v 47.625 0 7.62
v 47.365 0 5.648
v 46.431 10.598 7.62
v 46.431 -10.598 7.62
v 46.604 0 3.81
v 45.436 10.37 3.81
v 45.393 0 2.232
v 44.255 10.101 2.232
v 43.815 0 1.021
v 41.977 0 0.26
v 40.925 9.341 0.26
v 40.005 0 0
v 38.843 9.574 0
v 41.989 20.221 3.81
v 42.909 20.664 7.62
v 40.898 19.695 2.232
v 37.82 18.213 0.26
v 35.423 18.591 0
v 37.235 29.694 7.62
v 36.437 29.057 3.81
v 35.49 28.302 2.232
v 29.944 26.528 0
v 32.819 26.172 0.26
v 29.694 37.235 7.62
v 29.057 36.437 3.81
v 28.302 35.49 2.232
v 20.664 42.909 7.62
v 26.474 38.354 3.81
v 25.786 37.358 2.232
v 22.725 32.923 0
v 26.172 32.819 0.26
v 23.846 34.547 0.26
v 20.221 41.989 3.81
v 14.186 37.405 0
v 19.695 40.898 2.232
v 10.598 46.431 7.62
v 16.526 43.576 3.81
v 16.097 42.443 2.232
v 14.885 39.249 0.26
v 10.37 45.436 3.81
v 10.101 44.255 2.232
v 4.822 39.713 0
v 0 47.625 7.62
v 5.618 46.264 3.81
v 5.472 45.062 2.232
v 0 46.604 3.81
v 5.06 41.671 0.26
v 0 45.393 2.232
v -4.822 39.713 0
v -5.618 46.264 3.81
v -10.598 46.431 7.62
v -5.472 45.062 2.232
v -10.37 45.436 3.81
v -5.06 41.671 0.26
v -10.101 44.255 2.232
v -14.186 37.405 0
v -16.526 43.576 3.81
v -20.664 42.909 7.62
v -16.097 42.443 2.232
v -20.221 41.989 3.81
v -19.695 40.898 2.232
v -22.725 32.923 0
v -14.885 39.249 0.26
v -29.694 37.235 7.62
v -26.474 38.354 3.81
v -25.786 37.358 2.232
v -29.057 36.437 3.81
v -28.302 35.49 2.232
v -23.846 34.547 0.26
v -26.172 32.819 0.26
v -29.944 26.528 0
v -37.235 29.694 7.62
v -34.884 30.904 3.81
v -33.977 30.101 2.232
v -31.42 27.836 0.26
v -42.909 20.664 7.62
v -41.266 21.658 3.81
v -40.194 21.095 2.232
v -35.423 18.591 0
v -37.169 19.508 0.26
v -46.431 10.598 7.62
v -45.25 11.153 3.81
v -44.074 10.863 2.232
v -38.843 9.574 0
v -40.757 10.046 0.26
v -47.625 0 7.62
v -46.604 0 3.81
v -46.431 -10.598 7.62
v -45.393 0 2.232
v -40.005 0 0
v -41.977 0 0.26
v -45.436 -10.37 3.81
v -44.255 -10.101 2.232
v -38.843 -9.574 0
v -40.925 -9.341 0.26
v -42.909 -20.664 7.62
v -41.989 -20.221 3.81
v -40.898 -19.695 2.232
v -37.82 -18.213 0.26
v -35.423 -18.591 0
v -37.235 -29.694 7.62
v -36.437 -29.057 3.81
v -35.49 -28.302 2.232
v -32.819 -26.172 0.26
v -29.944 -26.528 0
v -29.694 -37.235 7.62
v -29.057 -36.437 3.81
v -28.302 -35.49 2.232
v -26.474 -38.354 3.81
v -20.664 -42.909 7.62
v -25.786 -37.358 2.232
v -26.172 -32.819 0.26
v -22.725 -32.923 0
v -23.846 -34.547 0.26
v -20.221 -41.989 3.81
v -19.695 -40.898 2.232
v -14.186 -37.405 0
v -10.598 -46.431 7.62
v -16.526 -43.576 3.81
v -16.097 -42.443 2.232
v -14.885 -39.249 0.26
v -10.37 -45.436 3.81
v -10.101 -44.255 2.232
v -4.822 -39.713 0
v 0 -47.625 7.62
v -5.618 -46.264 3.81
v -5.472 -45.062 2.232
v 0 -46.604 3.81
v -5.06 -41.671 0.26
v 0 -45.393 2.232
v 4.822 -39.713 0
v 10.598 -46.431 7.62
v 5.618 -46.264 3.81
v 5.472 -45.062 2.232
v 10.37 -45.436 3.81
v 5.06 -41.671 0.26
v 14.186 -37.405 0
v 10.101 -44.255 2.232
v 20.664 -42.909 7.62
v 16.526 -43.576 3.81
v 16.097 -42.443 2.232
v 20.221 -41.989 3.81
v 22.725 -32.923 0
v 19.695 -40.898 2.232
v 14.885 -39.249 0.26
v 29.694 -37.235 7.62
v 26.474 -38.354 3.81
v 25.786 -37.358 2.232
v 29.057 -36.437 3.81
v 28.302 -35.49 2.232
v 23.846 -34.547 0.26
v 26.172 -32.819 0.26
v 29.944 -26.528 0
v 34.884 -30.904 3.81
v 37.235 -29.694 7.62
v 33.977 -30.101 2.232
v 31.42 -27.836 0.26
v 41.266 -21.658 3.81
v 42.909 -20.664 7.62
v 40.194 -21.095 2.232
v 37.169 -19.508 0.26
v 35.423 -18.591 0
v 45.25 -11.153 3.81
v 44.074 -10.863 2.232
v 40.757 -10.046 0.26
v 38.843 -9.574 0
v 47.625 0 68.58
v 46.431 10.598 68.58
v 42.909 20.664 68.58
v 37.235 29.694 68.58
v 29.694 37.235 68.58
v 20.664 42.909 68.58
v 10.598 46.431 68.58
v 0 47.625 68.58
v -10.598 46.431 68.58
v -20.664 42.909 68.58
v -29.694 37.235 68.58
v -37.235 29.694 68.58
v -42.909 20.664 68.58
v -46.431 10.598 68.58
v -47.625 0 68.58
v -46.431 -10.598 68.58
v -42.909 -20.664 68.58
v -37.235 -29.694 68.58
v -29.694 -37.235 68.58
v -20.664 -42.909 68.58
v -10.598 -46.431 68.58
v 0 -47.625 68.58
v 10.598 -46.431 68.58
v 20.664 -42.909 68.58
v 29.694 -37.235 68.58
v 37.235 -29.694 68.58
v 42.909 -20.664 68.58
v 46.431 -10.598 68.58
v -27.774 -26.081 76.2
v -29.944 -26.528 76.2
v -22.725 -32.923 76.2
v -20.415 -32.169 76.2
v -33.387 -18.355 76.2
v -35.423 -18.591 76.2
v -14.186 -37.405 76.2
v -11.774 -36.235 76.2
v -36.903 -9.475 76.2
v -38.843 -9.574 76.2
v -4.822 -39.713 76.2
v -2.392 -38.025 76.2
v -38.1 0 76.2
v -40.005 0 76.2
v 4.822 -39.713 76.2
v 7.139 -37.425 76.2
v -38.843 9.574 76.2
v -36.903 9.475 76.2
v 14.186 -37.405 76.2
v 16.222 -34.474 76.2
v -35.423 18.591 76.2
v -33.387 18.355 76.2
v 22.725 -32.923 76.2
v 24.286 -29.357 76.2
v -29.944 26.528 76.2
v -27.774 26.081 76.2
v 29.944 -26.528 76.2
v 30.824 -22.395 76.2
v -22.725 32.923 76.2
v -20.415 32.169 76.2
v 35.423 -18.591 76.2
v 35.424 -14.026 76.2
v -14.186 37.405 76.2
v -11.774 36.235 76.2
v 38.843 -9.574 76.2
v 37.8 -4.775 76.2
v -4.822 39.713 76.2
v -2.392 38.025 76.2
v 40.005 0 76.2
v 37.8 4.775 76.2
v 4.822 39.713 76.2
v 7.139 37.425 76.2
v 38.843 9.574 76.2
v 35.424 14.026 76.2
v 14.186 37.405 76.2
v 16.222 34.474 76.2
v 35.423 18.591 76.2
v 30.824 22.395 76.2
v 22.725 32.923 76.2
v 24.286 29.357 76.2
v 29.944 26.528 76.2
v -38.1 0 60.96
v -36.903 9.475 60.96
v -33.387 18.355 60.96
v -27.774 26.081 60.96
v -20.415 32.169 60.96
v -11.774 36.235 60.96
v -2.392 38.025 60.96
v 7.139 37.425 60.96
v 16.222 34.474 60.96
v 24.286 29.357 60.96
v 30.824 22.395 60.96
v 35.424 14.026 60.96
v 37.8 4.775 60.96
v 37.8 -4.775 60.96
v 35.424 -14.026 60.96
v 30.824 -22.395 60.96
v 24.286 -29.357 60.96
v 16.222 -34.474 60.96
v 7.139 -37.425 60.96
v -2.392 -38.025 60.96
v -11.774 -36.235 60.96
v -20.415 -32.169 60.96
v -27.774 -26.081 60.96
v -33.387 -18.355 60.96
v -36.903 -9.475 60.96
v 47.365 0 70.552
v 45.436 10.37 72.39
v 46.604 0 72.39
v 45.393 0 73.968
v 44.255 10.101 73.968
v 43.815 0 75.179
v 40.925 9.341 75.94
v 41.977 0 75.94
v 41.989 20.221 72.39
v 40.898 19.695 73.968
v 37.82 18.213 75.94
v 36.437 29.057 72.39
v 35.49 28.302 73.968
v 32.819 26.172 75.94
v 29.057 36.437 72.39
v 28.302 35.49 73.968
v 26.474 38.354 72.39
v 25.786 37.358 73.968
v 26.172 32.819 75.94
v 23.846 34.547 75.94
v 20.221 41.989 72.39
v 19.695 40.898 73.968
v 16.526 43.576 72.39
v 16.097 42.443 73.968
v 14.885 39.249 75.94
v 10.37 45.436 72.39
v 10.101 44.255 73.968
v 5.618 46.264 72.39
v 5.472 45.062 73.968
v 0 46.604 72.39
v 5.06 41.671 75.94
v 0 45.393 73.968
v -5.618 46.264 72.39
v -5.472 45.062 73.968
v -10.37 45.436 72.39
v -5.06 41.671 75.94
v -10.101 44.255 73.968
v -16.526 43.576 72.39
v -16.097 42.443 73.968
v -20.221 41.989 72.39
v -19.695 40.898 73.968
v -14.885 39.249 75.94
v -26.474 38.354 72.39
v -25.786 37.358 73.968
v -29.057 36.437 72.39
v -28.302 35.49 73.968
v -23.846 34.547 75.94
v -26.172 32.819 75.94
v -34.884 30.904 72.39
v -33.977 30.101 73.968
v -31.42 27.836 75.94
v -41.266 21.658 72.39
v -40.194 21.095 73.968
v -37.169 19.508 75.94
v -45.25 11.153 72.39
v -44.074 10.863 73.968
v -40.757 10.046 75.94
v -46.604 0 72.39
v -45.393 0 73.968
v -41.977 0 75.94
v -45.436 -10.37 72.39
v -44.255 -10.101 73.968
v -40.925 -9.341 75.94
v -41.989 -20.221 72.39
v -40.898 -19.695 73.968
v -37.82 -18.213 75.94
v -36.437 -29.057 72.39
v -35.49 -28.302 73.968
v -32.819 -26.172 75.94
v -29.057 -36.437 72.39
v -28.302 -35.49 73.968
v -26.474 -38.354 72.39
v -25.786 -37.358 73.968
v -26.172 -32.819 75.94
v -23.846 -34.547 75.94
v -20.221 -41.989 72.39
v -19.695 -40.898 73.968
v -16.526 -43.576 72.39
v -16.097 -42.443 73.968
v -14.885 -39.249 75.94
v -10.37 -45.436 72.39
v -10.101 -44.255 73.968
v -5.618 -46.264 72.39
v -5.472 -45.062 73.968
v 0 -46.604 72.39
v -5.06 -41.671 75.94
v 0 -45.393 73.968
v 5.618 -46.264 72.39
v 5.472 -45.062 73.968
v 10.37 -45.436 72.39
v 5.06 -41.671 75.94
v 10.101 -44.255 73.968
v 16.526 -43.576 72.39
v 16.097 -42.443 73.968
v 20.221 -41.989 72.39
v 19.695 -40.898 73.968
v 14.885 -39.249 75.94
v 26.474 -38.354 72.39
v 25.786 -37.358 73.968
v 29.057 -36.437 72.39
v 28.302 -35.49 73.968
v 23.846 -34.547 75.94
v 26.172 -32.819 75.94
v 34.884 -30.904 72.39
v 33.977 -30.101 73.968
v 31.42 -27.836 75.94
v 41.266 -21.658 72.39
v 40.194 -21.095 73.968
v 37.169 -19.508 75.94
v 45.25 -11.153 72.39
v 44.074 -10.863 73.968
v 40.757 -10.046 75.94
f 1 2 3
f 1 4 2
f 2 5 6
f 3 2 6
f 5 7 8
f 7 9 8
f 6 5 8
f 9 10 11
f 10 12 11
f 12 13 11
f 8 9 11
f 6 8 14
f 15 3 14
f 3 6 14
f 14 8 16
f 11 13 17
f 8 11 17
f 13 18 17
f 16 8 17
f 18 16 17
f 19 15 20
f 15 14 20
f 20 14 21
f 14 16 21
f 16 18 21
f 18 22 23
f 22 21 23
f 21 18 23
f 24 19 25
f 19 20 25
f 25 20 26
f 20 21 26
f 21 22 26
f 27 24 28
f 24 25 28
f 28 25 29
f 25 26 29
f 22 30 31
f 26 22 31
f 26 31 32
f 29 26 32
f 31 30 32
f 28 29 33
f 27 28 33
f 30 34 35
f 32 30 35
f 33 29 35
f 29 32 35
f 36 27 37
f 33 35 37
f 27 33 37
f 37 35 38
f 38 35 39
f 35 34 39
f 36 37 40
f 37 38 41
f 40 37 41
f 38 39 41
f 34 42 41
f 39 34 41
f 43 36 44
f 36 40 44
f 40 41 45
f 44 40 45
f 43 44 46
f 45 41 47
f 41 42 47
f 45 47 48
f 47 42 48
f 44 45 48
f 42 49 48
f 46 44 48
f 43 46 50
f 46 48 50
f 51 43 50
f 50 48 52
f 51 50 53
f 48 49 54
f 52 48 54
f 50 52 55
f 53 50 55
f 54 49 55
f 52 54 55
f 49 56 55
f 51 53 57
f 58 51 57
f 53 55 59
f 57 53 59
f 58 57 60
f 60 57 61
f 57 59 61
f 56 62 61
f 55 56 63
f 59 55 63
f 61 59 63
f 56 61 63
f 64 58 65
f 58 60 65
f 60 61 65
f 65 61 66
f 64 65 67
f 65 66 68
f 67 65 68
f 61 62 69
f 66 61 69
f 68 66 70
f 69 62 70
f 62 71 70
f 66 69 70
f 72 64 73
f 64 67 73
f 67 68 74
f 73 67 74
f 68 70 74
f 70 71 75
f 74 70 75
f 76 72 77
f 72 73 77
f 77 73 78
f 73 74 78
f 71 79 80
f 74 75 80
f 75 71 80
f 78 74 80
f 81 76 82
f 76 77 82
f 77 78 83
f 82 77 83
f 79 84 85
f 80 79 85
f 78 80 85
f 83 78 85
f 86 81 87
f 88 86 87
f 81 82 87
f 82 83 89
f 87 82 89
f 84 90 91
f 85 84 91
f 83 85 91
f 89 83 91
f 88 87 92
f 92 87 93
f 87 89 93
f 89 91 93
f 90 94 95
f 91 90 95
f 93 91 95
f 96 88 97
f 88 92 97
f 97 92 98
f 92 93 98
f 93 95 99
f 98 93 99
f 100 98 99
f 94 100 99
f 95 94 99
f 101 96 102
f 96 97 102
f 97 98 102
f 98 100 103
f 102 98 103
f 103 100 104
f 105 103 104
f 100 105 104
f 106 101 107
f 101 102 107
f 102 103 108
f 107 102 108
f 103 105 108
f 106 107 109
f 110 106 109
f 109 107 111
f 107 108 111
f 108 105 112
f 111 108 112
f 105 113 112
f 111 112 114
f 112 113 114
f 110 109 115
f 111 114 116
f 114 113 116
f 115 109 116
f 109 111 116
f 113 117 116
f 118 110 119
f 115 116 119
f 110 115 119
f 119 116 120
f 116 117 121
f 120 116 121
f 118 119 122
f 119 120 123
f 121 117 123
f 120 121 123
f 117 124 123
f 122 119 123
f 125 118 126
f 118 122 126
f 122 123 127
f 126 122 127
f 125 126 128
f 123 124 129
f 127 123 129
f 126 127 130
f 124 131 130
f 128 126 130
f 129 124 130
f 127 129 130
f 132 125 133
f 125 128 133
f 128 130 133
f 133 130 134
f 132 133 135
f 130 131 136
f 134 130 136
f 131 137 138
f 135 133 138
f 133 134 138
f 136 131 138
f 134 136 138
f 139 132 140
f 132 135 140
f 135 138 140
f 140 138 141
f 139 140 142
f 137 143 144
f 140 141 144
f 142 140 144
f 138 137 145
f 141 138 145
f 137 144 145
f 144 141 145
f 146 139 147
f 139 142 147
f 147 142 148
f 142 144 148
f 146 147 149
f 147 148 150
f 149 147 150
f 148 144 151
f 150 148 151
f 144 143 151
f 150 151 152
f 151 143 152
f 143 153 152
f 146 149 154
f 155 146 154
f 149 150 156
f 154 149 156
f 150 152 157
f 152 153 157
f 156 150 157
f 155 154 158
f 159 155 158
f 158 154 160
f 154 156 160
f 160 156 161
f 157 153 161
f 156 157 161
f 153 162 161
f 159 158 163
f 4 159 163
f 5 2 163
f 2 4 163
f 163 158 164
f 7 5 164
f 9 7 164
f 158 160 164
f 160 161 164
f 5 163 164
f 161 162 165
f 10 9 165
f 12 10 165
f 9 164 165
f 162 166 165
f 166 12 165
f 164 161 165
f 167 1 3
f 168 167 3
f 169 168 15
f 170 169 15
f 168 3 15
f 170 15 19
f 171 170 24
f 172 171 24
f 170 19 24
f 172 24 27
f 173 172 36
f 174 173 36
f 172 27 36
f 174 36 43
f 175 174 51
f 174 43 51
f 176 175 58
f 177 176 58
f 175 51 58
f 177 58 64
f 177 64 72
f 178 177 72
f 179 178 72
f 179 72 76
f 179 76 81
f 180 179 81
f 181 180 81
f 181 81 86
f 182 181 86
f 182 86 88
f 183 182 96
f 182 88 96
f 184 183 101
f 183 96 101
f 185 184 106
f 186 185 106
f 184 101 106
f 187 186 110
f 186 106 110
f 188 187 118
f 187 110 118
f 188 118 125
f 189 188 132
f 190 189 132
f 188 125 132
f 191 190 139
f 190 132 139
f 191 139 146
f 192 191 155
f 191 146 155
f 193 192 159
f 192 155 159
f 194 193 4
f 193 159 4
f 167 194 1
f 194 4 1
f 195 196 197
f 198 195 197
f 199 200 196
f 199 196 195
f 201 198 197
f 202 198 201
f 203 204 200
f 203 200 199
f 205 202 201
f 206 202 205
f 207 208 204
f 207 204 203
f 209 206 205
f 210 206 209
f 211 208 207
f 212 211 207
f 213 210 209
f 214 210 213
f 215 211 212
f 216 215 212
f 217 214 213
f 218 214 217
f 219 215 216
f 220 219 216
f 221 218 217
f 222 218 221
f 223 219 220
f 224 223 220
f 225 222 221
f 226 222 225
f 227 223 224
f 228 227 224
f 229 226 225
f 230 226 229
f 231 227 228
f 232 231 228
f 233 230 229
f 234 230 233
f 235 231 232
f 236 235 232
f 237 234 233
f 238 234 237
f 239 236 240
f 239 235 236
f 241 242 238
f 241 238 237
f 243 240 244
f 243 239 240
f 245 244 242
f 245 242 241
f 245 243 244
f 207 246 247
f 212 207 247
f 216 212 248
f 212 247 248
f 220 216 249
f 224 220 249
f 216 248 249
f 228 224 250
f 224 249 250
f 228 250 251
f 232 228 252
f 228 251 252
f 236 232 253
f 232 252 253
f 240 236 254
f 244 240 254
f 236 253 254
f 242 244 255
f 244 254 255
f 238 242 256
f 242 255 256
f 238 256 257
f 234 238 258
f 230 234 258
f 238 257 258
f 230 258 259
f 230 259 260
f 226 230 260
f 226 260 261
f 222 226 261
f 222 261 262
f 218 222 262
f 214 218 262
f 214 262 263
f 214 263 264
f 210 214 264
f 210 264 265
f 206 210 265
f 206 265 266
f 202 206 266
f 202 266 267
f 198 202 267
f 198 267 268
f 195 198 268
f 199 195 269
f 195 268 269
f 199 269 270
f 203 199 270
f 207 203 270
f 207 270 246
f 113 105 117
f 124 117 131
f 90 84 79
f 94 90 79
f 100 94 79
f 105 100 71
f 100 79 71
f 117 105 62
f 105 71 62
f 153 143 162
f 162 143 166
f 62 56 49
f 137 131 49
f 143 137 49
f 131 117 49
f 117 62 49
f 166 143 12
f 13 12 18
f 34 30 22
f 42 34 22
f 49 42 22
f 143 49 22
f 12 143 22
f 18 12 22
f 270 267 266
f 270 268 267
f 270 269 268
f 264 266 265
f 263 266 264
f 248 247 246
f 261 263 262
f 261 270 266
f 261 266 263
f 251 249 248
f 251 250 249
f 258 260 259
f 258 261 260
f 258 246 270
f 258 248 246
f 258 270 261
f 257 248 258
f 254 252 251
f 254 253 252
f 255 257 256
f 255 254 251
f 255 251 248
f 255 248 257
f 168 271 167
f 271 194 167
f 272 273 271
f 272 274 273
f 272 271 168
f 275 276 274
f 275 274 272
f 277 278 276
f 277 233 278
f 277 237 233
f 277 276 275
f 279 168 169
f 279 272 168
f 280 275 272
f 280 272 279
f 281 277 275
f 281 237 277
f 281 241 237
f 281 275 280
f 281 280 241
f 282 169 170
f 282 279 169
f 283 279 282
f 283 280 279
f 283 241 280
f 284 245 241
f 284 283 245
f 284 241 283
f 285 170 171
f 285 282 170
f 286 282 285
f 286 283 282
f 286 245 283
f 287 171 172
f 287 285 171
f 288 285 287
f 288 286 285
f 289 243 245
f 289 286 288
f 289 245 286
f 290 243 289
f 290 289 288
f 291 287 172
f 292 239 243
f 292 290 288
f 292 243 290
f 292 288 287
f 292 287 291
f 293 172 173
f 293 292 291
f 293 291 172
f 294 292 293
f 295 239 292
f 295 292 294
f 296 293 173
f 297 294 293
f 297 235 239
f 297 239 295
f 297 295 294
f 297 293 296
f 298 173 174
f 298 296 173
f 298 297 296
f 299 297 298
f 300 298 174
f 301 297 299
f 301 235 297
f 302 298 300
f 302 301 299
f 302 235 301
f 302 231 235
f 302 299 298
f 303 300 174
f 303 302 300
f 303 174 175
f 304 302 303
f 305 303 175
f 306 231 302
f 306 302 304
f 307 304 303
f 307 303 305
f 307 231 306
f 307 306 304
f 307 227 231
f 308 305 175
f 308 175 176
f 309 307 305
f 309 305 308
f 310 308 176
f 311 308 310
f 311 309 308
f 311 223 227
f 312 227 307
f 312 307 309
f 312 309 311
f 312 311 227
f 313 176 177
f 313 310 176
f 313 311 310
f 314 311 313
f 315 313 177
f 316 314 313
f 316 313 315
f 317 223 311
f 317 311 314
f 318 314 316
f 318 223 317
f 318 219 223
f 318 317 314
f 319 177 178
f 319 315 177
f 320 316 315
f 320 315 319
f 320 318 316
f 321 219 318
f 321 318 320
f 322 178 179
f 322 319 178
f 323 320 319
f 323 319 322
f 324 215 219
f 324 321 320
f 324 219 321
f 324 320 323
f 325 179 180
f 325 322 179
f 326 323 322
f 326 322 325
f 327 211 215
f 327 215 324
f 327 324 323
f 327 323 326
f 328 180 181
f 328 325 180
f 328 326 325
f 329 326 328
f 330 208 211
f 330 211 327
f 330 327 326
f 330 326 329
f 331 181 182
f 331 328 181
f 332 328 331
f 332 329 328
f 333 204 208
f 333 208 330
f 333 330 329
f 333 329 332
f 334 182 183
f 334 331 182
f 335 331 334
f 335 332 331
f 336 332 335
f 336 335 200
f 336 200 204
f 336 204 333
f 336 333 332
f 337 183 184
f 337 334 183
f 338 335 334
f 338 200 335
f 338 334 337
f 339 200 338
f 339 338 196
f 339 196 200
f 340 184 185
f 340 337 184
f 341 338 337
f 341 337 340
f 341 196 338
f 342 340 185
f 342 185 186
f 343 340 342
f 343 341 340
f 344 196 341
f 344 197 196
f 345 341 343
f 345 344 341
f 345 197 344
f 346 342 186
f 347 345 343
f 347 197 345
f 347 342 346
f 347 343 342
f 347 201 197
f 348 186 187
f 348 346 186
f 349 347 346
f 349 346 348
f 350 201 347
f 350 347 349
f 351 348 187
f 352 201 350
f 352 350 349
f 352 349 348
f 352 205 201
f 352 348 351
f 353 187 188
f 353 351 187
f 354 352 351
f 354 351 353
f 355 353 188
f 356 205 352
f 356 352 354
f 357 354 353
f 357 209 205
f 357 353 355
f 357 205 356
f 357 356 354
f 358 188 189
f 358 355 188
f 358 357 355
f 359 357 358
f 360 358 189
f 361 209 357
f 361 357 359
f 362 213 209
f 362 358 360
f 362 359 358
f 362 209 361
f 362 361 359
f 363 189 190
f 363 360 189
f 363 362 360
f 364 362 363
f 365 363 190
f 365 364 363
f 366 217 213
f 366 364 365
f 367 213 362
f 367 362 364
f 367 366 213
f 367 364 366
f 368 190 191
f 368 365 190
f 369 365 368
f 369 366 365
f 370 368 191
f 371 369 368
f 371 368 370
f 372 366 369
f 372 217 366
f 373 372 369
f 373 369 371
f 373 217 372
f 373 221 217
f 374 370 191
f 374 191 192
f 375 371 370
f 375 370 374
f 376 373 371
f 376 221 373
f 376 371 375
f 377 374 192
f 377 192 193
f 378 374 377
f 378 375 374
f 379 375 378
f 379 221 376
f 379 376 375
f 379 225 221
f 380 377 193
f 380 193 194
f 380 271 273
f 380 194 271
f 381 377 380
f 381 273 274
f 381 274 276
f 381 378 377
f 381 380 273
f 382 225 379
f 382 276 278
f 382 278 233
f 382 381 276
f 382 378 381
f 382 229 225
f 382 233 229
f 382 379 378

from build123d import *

# Parameters (mm, degrees)
F0_R     = 47.625
F1_DEPTH = 76.2
F4_D     = 76.2
F5_R     = 7.62
F6_R     = 7.62
F7_R     = 38.1
F8_DEPTH = 60.96


with BuildPart() as f1:
    # F0 (on Top) → F1 (new body)
    with BuildSketch(Plane.XY):
        Circle(F0_R)
    extrude(amount=F1_DEPTH)

    # F4 (through all)
    with Locations(Plane.XY.offset(76.2)):
        with Locations((0, 0)):
            Hole(F4_D / 2)

    # F5
    f5_edges = [f1.edges().sort_by_distance(p)[0] for p in [
        (-47.625, 0, 76.2),
    ]]
    fillet(f5_edges, radius=F5_R)

    # F6
    f6_edges = [f1.edges().sort_by_distance(p)[0] for p in [
        (-47.625, 0, 0),
    ]]
    fillet(f6_edges, radius=F6_R)

    # F7 (on Top) → F8 (join)
    with BuildSketch(Plane.XY):
        Circle(F7_R)
    extrude(amount=F8_DEPTH)


solid = f1.part
